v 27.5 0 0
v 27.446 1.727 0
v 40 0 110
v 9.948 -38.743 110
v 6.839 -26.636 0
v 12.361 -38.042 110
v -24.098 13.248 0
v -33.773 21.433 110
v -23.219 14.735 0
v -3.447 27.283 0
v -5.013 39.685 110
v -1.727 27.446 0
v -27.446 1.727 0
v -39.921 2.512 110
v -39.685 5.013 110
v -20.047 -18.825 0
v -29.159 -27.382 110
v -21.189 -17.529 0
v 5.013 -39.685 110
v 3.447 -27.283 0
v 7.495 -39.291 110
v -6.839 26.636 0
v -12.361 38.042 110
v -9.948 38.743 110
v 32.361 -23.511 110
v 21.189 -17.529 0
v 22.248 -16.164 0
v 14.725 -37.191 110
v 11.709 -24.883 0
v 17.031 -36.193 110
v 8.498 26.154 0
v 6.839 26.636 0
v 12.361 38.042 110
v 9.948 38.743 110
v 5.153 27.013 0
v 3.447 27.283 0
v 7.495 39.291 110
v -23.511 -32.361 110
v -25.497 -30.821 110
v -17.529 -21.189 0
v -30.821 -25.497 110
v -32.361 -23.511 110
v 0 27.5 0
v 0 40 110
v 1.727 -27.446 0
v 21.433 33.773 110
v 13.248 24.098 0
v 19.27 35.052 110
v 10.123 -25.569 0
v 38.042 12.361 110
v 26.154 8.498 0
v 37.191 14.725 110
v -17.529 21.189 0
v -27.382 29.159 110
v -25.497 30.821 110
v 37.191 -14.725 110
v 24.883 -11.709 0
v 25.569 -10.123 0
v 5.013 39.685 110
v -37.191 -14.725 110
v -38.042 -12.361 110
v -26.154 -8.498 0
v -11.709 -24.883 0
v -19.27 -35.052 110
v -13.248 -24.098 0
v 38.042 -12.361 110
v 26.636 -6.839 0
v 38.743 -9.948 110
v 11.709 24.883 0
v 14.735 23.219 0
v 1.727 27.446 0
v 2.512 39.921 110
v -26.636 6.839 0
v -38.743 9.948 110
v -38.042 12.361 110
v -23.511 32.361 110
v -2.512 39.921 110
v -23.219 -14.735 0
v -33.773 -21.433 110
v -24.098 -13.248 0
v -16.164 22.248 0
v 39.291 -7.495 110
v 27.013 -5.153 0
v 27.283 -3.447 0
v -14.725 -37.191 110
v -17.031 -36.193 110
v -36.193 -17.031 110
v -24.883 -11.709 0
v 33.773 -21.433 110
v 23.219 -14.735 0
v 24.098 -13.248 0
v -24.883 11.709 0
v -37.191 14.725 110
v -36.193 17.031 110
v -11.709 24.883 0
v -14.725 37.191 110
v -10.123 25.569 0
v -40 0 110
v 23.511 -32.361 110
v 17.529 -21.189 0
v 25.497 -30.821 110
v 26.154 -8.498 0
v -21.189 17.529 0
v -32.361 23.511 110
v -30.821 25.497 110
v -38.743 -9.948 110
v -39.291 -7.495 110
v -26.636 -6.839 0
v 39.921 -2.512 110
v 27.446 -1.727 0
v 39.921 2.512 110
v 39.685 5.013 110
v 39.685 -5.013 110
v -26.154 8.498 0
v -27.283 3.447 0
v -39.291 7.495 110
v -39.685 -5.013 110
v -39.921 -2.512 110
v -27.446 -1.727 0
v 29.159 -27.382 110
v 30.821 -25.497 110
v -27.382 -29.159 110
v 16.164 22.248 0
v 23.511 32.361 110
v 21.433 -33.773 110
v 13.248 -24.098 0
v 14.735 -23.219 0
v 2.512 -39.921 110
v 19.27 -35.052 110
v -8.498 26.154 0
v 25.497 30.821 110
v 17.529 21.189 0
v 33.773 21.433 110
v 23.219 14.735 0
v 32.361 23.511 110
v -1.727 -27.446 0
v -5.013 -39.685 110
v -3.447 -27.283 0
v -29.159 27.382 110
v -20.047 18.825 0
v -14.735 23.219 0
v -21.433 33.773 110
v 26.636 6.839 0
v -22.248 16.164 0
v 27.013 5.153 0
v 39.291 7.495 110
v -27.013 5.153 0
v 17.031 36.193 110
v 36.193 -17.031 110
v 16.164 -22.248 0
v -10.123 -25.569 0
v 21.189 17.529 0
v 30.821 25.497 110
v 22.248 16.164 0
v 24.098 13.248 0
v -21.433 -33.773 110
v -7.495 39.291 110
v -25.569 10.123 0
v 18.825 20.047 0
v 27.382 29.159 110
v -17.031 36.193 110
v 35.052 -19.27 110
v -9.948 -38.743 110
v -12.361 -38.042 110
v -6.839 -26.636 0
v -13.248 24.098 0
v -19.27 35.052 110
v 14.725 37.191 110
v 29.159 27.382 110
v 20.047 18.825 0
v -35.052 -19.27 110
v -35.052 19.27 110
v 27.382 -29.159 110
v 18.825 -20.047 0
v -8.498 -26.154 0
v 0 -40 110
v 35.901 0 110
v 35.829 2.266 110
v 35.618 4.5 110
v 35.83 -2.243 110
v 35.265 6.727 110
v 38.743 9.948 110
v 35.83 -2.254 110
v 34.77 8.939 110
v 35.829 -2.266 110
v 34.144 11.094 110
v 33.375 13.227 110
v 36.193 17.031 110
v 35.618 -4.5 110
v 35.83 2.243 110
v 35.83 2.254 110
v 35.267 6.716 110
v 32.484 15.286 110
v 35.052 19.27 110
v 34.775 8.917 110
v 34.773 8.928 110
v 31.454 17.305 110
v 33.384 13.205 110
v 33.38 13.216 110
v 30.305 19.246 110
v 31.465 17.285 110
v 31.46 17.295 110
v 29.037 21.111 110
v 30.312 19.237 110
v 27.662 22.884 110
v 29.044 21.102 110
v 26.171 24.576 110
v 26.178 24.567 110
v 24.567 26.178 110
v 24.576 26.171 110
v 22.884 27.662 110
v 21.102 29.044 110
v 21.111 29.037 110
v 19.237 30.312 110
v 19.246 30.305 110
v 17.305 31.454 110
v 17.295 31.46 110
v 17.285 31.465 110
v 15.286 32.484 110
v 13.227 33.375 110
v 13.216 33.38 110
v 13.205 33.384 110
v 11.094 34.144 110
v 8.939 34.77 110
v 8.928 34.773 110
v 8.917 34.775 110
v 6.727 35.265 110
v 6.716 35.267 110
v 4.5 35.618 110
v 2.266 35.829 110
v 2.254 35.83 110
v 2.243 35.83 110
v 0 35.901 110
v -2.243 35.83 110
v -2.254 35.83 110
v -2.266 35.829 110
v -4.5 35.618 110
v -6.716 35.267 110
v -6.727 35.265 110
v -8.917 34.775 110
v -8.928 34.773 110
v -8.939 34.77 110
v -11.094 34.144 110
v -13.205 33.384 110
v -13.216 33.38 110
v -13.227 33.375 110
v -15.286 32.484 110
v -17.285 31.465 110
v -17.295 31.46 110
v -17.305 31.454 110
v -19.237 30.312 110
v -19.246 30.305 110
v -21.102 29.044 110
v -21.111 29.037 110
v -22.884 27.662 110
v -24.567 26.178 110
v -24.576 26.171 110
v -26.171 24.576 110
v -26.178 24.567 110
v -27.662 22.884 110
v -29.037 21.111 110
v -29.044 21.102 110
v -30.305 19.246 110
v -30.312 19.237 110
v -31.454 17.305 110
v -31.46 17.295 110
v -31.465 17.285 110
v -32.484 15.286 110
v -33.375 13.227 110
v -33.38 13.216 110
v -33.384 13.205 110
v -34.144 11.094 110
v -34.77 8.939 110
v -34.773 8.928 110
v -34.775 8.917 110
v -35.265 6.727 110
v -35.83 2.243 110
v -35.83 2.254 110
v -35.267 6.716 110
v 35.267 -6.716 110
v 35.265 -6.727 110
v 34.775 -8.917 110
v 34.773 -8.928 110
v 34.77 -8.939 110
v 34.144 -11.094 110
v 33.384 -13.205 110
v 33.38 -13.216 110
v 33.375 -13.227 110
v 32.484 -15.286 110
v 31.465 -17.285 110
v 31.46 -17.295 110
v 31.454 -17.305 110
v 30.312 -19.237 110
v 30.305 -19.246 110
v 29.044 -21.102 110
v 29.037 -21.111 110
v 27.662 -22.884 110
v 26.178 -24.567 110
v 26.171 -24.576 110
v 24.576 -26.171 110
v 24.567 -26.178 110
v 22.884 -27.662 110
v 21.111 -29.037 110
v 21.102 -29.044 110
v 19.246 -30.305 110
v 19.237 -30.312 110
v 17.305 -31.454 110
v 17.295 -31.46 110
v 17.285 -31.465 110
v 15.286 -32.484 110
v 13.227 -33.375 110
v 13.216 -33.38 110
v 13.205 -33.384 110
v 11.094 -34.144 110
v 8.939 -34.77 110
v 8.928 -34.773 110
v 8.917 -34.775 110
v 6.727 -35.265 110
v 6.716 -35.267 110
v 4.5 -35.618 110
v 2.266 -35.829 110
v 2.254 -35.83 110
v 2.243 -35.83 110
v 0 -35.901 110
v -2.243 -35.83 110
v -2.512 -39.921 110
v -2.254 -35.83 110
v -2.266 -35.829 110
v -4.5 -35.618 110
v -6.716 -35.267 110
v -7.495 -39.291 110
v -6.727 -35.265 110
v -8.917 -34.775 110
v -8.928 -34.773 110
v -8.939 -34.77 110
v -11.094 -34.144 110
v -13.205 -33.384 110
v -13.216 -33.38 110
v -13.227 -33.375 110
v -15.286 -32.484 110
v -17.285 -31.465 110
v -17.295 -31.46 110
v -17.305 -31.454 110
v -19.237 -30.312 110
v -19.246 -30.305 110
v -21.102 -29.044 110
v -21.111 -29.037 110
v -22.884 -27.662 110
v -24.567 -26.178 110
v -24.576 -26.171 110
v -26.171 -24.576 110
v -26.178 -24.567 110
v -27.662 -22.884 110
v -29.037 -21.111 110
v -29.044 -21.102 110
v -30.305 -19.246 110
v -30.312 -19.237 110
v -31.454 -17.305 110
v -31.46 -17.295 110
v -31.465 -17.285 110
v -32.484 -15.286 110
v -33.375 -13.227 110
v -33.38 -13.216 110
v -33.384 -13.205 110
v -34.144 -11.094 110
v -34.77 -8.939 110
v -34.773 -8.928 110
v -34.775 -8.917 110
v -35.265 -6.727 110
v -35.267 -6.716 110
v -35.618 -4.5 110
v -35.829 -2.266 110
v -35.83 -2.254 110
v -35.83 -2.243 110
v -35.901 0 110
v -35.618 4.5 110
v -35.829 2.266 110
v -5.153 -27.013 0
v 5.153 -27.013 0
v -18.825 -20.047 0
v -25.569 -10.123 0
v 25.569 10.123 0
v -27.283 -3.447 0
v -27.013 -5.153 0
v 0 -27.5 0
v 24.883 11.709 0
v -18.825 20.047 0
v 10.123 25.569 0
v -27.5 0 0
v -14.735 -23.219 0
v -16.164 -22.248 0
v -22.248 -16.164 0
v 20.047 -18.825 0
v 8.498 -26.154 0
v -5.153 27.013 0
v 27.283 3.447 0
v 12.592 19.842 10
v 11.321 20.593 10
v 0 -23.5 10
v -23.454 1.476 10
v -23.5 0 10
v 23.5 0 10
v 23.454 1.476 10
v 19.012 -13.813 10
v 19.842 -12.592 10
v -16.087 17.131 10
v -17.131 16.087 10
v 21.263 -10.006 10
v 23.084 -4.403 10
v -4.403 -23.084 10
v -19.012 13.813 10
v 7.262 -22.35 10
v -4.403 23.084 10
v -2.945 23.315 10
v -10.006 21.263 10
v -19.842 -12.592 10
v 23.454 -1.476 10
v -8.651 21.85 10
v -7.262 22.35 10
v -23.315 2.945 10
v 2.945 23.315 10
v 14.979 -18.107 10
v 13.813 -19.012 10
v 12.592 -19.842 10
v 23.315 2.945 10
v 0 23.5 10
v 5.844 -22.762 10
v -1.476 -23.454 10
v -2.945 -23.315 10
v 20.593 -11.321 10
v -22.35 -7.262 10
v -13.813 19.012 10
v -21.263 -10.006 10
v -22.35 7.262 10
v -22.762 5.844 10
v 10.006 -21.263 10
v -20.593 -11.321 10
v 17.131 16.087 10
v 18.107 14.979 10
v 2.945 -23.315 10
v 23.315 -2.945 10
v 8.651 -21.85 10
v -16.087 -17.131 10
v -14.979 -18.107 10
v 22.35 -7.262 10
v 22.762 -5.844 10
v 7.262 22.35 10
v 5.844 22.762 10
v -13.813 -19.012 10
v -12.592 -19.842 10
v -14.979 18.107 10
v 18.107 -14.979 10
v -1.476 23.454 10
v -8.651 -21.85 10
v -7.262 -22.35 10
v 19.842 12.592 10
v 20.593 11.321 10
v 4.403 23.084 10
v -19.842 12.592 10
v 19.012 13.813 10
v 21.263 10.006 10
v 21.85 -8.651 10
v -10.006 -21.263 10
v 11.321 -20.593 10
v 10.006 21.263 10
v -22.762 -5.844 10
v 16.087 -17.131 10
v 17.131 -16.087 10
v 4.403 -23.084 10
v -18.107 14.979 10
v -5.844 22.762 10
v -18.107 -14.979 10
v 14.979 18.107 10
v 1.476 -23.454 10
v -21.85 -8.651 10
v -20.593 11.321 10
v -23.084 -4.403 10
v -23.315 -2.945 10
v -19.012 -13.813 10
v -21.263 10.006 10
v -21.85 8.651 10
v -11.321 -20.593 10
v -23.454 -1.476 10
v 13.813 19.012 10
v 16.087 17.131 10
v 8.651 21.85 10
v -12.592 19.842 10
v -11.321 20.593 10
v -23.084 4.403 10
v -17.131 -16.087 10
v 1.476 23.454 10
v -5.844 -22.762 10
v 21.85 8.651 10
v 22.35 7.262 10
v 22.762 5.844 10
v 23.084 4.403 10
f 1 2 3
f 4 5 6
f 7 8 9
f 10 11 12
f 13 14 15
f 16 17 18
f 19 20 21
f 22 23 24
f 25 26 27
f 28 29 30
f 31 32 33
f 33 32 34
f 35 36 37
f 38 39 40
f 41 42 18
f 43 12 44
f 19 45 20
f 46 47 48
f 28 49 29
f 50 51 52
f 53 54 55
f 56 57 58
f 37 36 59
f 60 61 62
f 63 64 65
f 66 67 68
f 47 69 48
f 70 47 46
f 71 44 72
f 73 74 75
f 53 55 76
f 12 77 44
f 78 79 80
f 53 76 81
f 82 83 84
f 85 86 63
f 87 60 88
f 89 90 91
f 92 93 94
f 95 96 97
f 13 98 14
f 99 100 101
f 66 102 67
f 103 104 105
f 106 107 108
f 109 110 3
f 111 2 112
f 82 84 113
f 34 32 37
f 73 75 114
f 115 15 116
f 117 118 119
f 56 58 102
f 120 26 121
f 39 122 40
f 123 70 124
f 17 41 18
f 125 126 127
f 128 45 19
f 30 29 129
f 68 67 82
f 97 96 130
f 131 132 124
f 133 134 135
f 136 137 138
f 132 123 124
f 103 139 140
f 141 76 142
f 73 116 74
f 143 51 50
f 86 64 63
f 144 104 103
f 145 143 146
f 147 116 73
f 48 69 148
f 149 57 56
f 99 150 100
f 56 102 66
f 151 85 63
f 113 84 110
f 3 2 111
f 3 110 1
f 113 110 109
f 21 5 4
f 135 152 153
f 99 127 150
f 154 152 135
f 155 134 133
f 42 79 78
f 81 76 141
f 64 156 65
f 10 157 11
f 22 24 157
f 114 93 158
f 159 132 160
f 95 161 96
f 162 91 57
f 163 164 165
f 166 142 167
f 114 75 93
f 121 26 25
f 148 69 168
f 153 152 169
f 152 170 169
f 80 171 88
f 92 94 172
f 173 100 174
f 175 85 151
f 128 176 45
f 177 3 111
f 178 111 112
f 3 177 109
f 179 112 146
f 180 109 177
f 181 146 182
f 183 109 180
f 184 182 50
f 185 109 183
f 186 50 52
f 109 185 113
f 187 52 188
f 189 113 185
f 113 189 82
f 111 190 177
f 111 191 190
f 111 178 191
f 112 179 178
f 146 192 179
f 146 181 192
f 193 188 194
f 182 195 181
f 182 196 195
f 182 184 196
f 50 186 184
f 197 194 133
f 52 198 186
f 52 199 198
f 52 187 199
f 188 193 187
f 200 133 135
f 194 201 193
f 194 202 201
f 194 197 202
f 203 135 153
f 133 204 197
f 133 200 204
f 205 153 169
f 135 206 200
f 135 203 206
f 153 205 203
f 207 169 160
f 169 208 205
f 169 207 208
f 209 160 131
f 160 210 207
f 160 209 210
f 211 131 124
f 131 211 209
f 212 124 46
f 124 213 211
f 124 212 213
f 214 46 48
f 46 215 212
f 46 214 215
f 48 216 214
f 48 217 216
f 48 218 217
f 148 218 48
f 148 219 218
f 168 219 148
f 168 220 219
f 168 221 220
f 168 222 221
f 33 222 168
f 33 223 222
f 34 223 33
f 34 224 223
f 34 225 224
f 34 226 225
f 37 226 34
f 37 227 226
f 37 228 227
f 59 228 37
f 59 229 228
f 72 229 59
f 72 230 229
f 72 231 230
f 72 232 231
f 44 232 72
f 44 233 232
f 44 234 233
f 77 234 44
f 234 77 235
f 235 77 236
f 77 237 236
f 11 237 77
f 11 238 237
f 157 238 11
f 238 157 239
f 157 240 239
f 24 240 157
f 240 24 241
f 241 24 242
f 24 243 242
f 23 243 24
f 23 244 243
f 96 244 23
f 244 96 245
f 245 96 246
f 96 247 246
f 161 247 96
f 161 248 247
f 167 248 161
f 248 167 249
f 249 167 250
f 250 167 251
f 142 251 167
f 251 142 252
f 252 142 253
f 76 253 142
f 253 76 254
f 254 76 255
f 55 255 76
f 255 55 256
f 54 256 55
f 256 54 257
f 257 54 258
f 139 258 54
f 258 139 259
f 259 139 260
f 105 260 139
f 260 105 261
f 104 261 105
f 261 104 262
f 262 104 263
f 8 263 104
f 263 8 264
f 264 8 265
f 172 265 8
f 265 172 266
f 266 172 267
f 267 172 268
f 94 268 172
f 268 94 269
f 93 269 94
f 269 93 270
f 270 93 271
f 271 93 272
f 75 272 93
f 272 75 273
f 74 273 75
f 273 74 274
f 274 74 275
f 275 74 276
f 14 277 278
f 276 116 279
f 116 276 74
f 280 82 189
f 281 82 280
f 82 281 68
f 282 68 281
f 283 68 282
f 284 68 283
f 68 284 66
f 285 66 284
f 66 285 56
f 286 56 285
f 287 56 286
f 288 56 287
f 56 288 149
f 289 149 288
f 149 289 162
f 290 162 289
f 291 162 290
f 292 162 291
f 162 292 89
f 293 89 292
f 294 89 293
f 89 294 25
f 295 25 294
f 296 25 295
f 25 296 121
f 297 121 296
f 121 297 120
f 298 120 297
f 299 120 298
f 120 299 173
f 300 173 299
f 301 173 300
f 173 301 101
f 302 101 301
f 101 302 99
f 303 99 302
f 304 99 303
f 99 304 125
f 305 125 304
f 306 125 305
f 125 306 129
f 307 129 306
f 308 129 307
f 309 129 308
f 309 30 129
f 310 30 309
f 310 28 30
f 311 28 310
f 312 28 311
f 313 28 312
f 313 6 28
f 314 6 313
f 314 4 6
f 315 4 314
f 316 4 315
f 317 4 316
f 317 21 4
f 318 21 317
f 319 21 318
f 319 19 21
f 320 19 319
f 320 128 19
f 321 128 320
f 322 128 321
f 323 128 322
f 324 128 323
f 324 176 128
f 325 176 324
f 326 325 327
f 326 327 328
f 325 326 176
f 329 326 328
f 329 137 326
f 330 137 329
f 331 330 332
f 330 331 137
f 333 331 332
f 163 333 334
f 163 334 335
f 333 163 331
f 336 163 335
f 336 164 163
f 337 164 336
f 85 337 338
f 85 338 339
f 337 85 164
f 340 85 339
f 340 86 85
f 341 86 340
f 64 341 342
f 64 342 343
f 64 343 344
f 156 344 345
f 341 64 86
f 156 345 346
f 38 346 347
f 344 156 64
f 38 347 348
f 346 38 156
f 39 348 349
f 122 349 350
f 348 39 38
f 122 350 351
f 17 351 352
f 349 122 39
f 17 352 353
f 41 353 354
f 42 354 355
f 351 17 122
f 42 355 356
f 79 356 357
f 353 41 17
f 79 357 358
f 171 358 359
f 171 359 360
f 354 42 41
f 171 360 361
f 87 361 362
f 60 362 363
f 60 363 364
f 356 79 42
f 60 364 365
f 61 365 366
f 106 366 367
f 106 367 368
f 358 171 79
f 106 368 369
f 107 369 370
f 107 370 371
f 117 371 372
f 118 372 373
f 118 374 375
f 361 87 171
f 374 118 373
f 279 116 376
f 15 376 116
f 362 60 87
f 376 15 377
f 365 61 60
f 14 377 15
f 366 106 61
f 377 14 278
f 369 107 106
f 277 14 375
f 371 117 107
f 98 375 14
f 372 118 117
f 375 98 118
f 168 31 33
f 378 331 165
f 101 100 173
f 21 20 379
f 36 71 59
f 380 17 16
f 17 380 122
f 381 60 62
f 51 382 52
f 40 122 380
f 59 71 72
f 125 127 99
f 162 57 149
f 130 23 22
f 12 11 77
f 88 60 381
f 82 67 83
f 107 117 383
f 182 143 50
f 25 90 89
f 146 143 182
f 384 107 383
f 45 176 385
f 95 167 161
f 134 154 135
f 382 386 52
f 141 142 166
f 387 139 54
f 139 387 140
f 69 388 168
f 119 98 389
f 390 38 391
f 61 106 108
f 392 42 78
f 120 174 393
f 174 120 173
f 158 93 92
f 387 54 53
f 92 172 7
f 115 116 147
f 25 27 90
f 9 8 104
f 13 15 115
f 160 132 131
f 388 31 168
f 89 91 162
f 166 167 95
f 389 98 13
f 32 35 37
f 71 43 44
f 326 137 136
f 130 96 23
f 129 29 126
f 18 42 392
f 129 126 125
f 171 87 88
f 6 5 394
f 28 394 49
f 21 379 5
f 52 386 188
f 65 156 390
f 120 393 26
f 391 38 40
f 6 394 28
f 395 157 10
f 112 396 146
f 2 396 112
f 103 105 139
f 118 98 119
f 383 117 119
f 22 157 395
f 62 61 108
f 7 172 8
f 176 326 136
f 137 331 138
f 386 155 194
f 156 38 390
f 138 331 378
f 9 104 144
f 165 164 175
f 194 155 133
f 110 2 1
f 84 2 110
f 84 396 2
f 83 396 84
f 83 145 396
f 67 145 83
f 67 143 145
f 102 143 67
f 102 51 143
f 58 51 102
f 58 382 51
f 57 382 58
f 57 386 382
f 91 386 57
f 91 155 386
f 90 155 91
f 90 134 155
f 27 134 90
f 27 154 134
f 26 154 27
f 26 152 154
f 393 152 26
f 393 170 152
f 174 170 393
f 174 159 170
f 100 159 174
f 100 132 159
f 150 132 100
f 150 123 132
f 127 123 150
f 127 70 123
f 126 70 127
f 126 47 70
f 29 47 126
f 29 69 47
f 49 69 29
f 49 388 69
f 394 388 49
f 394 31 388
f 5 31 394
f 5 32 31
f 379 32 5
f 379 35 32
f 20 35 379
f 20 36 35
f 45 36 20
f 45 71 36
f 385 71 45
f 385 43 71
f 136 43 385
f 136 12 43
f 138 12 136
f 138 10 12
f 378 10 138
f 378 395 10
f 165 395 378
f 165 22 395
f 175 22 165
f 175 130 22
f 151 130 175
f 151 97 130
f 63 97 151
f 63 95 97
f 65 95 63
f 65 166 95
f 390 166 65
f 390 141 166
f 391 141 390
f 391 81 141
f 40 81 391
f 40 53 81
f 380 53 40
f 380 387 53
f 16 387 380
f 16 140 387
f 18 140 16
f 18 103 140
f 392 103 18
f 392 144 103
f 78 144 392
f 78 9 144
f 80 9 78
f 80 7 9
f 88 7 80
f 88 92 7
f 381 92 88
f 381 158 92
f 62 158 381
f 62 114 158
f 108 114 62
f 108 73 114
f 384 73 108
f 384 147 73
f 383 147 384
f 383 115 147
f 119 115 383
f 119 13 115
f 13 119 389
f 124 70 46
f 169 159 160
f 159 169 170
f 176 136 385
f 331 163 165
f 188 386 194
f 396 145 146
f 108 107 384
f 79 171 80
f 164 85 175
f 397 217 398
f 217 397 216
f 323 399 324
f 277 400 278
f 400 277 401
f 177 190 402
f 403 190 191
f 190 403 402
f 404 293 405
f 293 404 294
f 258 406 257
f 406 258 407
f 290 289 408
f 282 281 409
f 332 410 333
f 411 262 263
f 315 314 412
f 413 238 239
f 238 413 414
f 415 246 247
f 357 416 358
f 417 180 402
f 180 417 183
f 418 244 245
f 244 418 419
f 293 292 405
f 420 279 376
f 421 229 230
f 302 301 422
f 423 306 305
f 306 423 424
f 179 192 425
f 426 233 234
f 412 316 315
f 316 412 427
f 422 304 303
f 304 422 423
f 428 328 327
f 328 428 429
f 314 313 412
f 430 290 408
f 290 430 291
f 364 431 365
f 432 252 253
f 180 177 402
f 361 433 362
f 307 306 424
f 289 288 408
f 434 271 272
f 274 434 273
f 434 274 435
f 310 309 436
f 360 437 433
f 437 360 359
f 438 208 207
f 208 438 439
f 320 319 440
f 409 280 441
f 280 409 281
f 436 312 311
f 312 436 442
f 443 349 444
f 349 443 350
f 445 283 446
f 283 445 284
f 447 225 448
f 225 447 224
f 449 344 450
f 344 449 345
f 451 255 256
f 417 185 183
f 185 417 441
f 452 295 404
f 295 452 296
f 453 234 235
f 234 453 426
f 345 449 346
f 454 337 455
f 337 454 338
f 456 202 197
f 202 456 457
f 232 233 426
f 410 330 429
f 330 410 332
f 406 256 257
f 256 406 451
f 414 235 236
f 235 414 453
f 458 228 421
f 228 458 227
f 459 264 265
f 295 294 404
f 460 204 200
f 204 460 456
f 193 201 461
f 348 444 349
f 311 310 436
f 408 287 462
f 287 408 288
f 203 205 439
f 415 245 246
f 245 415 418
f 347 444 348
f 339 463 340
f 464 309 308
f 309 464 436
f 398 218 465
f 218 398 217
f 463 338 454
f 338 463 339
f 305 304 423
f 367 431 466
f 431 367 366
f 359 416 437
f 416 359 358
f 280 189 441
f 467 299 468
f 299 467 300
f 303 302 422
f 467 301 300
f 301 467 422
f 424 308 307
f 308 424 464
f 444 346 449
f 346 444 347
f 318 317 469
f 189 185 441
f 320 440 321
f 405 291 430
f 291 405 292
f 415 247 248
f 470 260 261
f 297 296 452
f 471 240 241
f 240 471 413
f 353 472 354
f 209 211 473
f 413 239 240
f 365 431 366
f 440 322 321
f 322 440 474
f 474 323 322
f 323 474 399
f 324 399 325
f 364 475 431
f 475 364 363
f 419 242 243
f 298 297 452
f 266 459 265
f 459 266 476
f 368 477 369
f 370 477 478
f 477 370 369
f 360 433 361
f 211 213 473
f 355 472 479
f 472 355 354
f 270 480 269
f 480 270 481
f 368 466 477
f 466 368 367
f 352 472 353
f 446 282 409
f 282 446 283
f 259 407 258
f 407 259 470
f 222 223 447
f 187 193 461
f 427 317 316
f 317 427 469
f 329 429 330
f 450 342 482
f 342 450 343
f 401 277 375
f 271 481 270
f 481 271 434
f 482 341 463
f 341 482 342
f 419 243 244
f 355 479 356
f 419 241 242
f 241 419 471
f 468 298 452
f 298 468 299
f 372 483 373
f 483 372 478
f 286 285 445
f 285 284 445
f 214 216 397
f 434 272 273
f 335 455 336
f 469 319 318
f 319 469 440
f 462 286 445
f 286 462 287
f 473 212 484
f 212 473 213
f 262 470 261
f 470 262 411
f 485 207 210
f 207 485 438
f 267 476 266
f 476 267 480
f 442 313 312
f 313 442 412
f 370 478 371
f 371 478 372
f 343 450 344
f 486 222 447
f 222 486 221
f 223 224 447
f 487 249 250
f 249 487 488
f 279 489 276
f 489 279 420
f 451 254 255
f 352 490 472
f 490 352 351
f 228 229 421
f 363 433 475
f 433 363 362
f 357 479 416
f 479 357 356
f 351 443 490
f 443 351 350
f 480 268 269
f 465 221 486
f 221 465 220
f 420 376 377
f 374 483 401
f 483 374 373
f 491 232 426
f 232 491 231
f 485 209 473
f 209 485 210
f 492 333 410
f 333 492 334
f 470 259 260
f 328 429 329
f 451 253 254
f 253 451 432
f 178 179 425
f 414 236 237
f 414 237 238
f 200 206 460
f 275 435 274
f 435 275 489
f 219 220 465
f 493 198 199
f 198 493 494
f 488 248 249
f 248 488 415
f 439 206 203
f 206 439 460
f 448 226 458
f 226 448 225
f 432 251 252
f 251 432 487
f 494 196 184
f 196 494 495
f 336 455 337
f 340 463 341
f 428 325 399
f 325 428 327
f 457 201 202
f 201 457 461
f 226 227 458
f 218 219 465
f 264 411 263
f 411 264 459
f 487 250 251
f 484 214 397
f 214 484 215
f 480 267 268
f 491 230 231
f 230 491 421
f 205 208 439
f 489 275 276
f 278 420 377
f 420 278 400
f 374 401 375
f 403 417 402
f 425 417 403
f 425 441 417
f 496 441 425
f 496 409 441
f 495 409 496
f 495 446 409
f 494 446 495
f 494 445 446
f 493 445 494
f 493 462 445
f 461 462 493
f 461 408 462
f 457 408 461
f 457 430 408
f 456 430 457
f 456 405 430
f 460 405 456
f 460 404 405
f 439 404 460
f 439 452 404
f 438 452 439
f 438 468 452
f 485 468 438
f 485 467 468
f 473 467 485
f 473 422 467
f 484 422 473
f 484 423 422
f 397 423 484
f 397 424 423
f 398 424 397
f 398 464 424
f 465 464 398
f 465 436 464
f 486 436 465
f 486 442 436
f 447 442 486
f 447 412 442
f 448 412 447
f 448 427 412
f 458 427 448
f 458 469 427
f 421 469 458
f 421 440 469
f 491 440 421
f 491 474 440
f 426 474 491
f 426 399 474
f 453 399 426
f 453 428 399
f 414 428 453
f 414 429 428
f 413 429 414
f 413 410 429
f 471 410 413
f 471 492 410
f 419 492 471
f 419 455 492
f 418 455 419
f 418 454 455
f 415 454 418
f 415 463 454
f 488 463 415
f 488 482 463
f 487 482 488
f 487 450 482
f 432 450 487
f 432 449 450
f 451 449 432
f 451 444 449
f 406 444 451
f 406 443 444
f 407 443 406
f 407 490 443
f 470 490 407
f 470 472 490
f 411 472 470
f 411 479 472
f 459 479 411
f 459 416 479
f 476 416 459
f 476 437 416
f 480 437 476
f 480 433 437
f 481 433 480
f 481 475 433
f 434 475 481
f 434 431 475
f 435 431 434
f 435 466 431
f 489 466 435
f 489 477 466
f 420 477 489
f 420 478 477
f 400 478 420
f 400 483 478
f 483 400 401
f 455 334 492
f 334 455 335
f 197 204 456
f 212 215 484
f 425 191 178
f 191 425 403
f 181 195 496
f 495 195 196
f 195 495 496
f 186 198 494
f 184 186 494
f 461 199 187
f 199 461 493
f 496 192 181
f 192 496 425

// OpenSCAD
//height of cup
hi=110;
//diameter of cup head
du=55;
//diameter of cup bottom
dd=80;
//quality
q=100;
//thickness of cup
th=4;

du1=du-th*2;
dd2=dd-th*2;
hi2=hi-th*2.3;
zh=th*2.5;

difference()
{
cylinder (d1=du, d2=dd, h=hi,$fn=q);
    translate([0,0,+zh])
cylinder (d1=du1, d2=dd2, h=hi2,$fn=q);
}
